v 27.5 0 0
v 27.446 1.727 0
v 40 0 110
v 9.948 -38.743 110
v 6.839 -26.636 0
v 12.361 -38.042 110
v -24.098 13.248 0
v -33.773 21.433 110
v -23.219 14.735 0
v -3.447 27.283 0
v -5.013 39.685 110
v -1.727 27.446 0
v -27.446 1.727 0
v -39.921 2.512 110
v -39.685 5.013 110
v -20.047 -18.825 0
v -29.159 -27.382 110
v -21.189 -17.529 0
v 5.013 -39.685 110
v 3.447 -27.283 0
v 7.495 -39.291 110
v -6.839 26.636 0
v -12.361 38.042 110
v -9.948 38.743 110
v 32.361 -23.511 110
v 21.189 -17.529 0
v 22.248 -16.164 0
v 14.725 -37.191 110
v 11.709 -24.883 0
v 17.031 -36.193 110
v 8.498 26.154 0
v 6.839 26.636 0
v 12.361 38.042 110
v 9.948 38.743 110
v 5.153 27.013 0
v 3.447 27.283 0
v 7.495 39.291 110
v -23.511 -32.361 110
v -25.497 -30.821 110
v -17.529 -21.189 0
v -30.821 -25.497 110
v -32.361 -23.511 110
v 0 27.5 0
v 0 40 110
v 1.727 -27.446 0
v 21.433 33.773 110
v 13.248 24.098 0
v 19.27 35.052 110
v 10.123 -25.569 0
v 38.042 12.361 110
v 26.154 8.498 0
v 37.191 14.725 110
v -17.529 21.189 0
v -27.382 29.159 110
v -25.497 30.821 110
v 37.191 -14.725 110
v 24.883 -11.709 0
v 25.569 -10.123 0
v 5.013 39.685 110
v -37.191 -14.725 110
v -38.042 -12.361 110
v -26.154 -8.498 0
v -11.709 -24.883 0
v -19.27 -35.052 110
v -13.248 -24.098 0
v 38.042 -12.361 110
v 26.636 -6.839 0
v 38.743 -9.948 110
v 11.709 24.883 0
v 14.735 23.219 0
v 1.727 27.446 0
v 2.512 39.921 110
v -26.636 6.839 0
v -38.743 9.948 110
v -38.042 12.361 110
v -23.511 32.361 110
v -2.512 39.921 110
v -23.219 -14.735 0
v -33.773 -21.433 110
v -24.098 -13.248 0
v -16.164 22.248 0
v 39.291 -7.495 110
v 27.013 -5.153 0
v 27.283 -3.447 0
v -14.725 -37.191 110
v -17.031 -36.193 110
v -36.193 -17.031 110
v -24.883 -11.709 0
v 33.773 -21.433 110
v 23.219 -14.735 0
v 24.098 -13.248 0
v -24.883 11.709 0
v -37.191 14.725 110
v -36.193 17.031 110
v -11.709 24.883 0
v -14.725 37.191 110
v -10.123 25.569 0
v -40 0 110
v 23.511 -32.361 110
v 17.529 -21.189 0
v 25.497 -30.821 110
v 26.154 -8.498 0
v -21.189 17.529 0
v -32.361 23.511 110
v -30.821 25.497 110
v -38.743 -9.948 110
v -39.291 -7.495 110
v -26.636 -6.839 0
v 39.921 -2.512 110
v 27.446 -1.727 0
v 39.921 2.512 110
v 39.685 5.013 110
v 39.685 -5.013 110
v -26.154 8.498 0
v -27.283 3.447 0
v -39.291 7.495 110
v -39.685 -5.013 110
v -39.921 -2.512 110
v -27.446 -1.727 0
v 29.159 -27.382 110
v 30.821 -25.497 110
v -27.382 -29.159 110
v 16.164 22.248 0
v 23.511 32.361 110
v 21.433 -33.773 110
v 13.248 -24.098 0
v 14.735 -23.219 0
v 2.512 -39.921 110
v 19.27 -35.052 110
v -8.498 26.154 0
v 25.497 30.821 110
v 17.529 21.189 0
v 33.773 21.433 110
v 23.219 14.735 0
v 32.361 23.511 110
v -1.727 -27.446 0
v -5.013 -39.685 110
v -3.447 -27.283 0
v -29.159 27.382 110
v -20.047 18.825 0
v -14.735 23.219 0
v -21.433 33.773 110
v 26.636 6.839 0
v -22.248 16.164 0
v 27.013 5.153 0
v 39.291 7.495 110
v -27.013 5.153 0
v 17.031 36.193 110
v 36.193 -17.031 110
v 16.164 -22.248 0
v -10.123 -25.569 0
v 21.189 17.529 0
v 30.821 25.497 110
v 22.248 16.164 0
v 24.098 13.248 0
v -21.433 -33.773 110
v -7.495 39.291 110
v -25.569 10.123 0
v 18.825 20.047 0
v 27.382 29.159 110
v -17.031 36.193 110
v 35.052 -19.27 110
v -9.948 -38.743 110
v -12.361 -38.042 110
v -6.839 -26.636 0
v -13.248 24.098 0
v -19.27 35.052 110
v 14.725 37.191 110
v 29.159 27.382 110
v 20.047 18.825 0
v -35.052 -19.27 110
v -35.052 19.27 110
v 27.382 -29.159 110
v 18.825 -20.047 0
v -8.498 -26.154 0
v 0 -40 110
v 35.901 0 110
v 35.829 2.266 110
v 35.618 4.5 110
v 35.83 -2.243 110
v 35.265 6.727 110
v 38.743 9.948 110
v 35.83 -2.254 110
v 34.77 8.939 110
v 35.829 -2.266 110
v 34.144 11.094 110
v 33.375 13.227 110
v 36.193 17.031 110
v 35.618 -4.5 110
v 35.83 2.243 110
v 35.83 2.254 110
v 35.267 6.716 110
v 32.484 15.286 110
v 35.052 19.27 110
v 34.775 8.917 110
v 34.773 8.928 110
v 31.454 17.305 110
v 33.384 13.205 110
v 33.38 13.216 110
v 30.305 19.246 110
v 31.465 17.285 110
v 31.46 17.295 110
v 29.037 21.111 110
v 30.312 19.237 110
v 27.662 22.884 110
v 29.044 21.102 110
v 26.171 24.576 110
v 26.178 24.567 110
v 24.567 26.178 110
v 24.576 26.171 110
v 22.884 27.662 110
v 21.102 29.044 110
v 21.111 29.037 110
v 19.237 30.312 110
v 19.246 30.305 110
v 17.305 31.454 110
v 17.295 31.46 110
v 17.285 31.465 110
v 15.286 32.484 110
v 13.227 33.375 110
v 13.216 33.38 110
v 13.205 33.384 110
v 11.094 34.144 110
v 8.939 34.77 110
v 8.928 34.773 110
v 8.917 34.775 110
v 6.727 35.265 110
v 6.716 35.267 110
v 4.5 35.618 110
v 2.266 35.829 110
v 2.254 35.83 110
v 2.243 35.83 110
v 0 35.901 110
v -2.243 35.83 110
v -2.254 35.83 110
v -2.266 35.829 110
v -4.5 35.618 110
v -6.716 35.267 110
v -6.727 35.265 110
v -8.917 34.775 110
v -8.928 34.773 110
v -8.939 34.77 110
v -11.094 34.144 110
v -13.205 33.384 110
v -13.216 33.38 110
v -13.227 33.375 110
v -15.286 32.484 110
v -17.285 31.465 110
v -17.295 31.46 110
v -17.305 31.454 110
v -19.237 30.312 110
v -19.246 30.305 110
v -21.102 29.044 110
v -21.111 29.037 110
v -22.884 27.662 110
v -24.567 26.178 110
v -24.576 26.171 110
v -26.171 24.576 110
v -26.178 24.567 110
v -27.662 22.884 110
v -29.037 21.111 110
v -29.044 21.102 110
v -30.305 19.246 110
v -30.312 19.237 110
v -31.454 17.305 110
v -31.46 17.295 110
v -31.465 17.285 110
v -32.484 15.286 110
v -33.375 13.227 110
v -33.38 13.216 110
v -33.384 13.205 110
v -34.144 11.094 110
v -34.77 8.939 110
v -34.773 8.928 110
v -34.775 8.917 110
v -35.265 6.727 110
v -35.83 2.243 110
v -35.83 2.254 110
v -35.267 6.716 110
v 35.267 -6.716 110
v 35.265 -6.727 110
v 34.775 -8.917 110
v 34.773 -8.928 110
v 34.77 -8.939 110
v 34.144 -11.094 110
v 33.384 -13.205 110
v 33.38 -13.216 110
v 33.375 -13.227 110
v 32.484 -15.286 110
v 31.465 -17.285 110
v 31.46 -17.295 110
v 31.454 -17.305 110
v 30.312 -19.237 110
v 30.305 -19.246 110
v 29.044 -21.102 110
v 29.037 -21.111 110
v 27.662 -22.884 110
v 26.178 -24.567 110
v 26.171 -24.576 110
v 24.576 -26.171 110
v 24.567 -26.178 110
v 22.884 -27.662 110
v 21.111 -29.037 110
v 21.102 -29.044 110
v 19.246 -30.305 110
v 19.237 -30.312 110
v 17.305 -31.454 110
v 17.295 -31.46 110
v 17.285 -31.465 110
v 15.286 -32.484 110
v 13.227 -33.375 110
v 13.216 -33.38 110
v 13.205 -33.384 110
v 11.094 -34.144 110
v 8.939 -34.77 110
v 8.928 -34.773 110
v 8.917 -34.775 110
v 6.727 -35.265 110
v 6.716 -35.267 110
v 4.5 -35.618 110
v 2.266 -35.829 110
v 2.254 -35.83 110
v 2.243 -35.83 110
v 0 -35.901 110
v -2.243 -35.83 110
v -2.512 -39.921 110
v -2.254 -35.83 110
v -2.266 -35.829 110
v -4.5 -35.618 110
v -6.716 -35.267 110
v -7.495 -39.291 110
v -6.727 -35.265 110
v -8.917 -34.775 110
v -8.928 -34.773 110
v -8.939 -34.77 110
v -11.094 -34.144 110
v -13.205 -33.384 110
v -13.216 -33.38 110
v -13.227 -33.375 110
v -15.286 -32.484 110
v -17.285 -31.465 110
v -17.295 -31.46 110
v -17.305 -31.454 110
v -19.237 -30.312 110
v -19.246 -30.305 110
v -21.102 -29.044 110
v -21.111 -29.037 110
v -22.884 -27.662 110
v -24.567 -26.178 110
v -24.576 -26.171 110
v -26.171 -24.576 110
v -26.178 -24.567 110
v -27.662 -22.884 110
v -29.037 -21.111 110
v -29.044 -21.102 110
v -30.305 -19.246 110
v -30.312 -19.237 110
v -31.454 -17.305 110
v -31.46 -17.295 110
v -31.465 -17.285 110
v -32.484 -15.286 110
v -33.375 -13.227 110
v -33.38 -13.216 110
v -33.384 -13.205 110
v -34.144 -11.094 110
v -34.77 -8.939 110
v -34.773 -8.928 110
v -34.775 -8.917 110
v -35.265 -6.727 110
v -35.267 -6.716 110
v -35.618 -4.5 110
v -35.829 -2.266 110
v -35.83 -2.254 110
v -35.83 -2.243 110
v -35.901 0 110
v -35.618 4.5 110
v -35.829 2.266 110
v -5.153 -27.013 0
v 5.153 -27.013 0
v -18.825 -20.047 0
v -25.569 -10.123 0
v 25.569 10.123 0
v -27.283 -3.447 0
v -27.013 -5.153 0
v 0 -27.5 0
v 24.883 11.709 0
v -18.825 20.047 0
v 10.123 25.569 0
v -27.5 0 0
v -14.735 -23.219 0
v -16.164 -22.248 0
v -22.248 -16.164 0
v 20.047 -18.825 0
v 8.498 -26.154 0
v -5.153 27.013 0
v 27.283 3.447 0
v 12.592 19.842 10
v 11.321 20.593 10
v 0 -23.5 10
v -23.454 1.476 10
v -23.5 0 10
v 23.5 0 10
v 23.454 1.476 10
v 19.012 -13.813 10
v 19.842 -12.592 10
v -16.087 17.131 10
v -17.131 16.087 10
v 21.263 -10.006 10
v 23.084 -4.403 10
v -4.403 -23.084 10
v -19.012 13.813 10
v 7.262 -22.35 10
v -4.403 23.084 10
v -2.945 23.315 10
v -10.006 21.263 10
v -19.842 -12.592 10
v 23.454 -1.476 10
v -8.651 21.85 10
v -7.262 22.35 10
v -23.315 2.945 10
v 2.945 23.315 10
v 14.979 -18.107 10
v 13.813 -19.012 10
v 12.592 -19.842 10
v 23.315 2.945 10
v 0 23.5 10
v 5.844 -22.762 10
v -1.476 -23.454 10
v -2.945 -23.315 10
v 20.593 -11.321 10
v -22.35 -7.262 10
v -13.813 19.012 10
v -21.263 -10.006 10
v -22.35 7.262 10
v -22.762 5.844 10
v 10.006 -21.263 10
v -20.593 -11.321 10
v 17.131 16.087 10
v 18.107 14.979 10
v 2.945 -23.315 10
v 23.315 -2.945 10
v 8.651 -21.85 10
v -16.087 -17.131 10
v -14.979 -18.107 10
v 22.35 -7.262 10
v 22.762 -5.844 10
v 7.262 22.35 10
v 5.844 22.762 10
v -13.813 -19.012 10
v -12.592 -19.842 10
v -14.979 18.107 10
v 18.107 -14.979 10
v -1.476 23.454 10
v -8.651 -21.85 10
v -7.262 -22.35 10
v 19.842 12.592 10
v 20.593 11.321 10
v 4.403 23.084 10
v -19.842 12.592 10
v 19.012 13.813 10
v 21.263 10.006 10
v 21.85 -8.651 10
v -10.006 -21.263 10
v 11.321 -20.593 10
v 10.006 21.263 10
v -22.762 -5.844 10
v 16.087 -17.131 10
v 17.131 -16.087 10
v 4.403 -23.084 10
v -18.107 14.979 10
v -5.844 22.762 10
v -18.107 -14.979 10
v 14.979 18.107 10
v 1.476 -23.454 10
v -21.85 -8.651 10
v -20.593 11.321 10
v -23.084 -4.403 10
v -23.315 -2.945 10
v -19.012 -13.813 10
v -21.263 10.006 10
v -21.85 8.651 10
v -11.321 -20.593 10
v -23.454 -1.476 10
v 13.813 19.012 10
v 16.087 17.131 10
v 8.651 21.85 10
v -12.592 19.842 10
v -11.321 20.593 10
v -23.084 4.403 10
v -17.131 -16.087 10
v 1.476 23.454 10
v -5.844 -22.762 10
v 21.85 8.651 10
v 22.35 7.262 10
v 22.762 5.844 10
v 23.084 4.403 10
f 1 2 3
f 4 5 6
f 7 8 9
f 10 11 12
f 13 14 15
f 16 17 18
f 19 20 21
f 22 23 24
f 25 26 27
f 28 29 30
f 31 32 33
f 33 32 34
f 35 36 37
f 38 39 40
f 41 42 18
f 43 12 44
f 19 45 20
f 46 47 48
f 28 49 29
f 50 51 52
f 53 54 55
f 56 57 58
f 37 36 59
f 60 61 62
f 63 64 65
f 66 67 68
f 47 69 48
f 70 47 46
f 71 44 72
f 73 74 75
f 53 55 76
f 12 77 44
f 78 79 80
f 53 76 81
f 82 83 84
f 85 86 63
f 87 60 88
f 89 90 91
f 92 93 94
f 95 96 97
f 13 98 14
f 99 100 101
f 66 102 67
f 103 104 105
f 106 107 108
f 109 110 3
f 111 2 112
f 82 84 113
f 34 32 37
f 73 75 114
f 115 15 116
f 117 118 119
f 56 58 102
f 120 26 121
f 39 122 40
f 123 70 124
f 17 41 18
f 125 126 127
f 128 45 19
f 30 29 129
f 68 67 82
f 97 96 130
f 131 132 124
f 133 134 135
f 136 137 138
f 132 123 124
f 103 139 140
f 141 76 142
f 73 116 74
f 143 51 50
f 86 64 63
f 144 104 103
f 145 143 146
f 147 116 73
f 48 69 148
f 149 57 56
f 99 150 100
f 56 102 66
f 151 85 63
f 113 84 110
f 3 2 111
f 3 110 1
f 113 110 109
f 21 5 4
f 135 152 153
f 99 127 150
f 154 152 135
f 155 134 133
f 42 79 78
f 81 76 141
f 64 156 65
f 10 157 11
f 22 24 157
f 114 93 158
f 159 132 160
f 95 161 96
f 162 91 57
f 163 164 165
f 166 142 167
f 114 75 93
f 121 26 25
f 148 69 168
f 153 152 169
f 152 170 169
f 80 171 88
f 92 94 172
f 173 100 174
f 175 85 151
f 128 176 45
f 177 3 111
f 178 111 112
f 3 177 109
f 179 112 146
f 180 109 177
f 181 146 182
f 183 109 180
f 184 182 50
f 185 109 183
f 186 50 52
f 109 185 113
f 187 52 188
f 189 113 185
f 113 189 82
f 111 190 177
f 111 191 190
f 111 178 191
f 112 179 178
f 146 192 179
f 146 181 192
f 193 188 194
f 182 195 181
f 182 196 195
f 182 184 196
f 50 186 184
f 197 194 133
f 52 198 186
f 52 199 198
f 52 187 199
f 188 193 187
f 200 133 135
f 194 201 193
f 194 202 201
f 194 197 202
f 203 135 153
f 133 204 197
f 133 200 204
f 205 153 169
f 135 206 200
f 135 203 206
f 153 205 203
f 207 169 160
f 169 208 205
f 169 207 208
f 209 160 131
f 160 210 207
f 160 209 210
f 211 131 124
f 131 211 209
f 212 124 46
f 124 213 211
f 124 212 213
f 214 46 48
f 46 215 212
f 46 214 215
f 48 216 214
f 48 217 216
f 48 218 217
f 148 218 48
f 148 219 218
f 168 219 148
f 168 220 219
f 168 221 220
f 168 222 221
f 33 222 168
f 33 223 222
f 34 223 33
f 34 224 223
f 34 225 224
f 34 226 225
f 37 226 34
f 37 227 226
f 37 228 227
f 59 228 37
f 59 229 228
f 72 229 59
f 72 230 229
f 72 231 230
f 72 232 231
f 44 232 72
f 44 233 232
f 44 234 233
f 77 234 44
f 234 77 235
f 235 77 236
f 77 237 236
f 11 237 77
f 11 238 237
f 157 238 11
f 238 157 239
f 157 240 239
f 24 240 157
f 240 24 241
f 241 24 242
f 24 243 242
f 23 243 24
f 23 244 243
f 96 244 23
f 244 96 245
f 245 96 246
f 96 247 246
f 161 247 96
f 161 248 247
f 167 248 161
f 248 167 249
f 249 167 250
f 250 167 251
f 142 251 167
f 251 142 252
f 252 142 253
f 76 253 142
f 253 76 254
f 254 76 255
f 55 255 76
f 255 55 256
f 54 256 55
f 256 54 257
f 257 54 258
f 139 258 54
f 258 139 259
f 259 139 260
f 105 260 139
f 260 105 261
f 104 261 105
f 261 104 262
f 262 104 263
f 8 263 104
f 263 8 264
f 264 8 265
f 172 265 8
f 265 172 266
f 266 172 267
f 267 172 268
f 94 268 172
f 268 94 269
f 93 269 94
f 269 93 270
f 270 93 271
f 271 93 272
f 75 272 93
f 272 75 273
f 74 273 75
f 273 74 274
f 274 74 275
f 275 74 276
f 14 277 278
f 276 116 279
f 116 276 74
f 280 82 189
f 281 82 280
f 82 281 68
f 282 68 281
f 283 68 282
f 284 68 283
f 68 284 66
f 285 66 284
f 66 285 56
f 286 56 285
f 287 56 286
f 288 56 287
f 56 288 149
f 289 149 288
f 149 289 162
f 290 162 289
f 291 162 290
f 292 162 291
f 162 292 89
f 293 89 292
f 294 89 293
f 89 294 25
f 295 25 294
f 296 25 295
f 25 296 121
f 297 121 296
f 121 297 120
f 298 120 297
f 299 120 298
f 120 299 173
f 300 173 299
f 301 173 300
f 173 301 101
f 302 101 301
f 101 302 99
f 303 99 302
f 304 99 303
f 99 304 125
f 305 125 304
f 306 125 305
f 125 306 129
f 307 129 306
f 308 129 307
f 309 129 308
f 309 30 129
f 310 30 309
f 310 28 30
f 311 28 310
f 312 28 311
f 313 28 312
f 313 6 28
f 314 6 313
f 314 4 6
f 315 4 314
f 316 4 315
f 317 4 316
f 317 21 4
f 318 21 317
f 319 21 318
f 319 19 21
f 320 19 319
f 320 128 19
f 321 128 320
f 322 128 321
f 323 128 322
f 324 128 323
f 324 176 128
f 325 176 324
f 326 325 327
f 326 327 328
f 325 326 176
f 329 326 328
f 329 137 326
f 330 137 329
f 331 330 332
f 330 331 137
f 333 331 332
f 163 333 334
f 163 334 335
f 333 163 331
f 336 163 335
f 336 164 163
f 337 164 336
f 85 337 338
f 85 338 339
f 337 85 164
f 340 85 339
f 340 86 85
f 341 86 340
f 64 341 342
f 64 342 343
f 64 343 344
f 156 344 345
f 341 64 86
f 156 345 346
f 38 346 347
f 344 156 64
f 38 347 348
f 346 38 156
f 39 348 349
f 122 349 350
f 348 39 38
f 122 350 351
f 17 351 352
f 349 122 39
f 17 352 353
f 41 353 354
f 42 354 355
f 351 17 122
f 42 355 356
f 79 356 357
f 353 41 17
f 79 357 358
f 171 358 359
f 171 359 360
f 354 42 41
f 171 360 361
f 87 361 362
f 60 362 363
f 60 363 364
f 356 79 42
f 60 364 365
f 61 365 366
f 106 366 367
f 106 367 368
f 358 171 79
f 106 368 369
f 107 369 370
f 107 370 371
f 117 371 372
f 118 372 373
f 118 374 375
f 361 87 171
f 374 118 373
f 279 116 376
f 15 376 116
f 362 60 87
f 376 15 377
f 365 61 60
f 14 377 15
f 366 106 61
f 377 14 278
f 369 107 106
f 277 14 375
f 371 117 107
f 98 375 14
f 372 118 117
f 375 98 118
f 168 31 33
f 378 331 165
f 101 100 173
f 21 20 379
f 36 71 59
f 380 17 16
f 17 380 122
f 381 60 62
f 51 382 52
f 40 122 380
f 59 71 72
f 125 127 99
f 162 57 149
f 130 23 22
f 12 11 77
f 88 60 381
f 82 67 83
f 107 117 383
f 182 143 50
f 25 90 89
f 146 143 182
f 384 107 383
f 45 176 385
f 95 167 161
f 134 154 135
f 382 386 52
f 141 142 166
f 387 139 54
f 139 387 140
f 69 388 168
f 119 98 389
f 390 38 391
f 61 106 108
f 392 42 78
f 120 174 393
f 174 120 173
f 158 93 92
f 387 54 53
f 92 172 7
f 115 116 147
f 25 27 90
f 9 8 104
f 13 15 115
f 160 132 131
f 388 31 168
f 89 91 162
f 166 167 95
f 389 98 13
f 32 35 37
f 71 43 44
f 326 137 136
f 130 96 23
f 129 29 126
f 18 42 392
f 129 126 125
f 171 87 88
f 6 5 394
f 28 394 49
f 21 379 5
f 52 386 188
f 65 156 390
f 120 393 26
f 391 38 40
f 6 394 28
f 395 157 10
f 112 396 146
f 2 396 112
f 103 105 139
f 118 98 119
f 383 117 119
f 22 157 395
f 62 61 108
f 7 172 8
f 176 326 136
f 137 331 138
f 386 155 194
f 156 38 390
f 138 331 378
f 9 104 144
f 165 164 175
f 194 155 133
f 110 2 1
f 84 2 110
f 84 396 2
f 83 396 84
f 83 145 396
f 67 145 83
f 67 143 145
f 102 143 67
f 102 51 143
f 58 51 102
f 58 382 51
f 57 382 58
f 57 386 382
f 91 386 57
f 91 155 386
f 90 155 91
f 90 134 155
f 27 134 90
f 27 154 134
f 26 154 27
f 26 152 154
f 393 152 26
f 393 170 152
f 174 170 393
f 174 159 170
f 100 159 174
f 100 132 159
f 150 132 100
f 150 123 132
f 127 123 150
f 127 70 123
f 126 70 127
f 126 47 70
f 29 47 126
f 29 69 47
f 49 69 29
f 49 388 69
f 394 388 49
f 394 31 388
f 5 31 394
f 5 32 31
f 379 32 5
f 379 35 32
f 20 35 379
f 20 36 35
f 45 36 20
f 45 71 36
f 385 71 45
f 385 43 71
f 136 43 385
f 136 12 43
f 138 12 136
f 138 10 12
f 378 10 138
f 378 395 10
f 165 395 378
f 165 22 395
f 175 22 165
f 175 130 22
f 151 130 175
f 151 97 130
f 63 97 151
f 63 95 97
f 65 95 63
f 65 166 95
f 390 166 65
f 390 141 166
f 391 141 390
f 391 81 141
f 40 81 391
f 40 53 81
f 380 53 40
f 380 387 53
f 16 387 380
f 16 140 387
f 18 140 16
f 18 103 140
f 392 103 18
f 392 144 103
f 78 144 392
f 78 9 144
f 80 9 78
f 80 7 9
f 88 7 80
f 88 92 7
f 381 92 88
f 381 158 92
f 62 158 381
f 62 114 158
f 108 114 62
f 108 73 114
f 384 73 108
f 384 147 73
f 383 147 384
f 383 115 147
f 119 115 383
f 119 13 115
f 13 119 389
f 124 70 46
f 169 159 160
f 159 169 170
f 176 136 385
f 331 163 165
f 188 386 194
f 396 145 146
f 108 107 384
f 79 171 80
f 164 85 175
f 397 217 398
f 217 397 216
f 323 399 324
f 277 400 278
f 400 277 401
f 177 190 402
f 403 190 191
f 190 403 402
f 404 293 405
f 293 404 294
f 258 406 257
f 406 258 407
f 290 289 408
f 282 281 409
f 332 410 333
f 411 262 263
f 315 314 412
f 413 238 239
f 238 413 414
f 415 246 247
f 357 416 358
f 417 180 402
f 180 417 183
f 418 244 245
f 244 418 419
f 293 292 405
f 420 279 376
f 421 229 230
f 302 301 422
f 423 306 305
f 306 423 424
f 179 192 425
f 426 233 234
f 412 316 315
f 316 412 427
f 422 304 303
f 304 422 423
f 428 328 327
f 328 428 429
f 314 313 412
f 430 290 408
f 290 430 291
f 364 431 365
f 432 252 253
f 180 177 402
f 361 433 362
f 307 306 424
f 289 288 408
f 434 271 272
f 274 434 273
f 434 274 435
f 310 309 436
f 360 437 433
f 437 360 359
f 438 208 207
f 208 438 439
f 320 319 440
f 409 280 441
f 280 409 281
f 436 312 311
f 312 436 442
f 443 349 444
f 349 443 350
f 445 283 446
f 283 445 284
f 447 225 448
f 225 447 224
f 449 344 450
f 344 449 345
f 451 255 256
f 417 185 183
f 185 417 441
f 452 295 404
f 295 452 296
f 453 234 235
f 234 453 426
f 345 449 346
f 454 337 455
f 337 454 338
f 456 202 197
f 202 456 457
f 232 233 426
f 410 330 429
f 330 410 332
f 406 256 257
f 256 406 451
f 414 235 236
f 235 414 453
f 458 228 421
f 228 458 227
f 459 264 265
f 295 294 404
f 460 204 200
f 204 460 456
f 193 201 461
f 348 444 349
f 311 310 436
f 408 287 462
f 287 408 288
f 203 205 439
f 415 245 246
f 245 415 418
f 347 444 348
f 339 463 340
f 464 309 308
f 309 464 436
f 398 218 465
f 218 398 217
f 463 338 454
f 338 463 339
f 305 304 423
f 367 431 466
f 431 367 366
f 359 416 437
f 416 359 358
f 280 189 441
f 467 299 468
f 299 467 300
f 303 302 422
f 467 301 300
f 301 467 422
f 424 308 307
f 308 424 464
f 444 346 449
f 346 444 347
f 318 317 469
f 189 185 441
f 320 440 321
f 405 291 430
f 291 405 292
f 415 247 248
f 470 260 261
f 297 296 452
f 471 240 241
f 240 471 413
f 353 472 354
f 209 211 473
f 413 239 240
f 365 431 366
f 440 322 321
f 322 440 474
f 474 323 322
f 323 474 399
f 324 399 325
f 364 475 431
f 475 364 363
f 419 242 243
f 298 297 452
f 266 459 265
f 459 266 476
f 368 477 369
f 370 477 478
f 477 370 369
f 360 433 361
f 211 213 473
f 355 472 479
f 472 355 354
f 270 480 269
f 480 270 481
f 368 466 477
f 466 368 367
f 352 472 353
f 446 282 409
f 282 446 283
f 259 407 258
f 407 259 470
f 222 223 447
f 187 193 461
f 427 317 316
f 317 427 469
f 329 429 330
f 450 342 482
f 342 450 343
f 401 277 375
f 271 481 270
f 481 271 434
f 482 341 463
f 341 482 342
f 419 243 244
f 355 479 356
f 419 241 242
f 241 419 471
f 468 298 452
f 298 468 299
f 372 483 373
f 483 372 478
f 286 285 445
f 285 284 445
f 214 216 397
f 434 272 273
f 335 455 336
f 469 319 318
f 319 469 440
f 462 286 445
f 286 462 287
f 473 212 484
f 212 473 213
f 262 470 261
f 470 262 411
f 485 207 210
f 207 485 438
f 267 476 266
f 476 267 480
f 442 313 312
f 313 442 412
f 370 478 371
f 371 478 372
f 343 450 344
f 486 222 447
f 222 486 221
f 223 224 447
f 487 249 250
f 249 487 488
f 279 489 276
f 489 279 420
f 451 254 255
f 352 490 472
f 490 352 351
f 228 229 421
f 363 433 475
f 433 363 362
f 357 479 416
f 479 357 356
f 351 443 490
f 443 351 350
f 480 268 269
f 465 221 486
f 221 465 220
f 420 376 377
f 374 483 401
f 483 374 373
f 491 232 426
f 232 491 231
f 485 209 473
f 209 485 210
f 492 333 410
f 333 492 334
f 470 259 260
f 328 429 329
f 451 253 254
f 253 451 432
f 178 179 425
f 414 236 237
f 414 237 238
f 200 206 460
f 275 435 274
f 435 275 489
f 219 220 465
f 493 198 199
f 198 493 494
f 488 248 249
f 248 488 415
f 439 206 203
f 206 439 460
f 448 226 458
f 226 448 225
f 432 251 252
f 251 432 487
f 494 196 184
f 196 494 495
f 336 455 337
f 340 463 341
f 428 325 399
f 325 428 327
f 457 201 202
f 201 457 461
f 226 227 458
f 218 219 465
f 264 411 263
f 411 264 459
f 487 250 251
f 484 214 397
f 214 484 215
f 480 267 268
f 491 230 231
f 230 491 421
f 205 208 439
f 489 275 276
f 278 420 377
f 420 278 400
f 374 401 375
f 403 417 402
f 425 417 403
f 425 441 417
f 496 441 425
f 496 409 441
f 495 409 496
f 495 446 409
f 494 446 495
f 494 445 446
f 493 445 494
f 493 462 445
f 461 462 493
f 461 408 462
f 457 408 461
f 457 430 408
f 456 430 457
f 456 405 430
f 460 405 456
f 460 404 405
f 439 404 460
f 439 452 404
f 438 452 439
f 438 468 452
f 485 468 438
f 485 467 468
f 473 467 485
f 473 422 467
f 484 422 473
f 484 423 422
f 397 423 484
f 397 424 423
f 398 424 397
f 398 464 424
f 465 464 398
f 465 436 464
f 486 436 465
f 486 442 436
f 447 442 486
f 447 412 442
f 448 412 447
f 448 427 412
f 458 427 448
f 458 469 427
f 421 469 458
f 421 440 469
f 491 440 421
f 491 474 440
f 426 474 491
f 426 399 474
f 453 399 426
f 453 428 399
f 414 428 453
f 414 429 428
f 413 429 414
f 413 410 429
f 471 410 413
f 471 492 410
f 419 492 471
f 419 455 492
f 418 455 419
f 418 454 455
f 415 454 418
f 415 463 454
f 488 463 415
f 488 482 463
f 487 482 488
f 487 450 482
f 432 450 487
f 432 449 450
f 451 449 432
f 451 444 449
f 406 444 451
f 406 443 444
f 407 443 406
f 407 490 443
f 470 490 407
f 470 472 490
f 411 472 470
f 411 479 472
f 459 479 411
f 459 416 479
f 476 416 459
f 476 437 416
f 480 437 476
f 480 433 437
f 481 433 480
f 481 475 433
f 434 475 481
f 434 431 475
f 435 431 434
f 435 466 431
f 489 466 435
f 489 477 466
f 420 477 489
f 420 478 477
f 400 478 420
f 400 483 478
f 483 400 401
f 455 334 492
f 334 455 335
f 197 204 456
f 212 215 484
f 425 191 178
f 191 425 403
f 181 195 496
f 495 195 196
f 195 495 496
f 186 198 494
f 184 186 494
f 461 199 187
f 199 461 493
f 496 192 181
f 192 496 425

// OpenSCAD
//height of cup
hi=110;
//diameter of cup head
du=55;
//diameter of cup bottom
dd=80;
//quality
q=100;
//thickness of cup
th=4;

du1=du-th*2;
dd2=dd-th*2;
hi2=hi-th*2.3;
zh=th*2.5;

difference()
{
cylinder (d1=du, d2=dd, h=hi,$fn=q);
    translate([0,0,+zh])
cylinder (d1=du1, d2=dd2, h=hi2,$fn=q);
}
